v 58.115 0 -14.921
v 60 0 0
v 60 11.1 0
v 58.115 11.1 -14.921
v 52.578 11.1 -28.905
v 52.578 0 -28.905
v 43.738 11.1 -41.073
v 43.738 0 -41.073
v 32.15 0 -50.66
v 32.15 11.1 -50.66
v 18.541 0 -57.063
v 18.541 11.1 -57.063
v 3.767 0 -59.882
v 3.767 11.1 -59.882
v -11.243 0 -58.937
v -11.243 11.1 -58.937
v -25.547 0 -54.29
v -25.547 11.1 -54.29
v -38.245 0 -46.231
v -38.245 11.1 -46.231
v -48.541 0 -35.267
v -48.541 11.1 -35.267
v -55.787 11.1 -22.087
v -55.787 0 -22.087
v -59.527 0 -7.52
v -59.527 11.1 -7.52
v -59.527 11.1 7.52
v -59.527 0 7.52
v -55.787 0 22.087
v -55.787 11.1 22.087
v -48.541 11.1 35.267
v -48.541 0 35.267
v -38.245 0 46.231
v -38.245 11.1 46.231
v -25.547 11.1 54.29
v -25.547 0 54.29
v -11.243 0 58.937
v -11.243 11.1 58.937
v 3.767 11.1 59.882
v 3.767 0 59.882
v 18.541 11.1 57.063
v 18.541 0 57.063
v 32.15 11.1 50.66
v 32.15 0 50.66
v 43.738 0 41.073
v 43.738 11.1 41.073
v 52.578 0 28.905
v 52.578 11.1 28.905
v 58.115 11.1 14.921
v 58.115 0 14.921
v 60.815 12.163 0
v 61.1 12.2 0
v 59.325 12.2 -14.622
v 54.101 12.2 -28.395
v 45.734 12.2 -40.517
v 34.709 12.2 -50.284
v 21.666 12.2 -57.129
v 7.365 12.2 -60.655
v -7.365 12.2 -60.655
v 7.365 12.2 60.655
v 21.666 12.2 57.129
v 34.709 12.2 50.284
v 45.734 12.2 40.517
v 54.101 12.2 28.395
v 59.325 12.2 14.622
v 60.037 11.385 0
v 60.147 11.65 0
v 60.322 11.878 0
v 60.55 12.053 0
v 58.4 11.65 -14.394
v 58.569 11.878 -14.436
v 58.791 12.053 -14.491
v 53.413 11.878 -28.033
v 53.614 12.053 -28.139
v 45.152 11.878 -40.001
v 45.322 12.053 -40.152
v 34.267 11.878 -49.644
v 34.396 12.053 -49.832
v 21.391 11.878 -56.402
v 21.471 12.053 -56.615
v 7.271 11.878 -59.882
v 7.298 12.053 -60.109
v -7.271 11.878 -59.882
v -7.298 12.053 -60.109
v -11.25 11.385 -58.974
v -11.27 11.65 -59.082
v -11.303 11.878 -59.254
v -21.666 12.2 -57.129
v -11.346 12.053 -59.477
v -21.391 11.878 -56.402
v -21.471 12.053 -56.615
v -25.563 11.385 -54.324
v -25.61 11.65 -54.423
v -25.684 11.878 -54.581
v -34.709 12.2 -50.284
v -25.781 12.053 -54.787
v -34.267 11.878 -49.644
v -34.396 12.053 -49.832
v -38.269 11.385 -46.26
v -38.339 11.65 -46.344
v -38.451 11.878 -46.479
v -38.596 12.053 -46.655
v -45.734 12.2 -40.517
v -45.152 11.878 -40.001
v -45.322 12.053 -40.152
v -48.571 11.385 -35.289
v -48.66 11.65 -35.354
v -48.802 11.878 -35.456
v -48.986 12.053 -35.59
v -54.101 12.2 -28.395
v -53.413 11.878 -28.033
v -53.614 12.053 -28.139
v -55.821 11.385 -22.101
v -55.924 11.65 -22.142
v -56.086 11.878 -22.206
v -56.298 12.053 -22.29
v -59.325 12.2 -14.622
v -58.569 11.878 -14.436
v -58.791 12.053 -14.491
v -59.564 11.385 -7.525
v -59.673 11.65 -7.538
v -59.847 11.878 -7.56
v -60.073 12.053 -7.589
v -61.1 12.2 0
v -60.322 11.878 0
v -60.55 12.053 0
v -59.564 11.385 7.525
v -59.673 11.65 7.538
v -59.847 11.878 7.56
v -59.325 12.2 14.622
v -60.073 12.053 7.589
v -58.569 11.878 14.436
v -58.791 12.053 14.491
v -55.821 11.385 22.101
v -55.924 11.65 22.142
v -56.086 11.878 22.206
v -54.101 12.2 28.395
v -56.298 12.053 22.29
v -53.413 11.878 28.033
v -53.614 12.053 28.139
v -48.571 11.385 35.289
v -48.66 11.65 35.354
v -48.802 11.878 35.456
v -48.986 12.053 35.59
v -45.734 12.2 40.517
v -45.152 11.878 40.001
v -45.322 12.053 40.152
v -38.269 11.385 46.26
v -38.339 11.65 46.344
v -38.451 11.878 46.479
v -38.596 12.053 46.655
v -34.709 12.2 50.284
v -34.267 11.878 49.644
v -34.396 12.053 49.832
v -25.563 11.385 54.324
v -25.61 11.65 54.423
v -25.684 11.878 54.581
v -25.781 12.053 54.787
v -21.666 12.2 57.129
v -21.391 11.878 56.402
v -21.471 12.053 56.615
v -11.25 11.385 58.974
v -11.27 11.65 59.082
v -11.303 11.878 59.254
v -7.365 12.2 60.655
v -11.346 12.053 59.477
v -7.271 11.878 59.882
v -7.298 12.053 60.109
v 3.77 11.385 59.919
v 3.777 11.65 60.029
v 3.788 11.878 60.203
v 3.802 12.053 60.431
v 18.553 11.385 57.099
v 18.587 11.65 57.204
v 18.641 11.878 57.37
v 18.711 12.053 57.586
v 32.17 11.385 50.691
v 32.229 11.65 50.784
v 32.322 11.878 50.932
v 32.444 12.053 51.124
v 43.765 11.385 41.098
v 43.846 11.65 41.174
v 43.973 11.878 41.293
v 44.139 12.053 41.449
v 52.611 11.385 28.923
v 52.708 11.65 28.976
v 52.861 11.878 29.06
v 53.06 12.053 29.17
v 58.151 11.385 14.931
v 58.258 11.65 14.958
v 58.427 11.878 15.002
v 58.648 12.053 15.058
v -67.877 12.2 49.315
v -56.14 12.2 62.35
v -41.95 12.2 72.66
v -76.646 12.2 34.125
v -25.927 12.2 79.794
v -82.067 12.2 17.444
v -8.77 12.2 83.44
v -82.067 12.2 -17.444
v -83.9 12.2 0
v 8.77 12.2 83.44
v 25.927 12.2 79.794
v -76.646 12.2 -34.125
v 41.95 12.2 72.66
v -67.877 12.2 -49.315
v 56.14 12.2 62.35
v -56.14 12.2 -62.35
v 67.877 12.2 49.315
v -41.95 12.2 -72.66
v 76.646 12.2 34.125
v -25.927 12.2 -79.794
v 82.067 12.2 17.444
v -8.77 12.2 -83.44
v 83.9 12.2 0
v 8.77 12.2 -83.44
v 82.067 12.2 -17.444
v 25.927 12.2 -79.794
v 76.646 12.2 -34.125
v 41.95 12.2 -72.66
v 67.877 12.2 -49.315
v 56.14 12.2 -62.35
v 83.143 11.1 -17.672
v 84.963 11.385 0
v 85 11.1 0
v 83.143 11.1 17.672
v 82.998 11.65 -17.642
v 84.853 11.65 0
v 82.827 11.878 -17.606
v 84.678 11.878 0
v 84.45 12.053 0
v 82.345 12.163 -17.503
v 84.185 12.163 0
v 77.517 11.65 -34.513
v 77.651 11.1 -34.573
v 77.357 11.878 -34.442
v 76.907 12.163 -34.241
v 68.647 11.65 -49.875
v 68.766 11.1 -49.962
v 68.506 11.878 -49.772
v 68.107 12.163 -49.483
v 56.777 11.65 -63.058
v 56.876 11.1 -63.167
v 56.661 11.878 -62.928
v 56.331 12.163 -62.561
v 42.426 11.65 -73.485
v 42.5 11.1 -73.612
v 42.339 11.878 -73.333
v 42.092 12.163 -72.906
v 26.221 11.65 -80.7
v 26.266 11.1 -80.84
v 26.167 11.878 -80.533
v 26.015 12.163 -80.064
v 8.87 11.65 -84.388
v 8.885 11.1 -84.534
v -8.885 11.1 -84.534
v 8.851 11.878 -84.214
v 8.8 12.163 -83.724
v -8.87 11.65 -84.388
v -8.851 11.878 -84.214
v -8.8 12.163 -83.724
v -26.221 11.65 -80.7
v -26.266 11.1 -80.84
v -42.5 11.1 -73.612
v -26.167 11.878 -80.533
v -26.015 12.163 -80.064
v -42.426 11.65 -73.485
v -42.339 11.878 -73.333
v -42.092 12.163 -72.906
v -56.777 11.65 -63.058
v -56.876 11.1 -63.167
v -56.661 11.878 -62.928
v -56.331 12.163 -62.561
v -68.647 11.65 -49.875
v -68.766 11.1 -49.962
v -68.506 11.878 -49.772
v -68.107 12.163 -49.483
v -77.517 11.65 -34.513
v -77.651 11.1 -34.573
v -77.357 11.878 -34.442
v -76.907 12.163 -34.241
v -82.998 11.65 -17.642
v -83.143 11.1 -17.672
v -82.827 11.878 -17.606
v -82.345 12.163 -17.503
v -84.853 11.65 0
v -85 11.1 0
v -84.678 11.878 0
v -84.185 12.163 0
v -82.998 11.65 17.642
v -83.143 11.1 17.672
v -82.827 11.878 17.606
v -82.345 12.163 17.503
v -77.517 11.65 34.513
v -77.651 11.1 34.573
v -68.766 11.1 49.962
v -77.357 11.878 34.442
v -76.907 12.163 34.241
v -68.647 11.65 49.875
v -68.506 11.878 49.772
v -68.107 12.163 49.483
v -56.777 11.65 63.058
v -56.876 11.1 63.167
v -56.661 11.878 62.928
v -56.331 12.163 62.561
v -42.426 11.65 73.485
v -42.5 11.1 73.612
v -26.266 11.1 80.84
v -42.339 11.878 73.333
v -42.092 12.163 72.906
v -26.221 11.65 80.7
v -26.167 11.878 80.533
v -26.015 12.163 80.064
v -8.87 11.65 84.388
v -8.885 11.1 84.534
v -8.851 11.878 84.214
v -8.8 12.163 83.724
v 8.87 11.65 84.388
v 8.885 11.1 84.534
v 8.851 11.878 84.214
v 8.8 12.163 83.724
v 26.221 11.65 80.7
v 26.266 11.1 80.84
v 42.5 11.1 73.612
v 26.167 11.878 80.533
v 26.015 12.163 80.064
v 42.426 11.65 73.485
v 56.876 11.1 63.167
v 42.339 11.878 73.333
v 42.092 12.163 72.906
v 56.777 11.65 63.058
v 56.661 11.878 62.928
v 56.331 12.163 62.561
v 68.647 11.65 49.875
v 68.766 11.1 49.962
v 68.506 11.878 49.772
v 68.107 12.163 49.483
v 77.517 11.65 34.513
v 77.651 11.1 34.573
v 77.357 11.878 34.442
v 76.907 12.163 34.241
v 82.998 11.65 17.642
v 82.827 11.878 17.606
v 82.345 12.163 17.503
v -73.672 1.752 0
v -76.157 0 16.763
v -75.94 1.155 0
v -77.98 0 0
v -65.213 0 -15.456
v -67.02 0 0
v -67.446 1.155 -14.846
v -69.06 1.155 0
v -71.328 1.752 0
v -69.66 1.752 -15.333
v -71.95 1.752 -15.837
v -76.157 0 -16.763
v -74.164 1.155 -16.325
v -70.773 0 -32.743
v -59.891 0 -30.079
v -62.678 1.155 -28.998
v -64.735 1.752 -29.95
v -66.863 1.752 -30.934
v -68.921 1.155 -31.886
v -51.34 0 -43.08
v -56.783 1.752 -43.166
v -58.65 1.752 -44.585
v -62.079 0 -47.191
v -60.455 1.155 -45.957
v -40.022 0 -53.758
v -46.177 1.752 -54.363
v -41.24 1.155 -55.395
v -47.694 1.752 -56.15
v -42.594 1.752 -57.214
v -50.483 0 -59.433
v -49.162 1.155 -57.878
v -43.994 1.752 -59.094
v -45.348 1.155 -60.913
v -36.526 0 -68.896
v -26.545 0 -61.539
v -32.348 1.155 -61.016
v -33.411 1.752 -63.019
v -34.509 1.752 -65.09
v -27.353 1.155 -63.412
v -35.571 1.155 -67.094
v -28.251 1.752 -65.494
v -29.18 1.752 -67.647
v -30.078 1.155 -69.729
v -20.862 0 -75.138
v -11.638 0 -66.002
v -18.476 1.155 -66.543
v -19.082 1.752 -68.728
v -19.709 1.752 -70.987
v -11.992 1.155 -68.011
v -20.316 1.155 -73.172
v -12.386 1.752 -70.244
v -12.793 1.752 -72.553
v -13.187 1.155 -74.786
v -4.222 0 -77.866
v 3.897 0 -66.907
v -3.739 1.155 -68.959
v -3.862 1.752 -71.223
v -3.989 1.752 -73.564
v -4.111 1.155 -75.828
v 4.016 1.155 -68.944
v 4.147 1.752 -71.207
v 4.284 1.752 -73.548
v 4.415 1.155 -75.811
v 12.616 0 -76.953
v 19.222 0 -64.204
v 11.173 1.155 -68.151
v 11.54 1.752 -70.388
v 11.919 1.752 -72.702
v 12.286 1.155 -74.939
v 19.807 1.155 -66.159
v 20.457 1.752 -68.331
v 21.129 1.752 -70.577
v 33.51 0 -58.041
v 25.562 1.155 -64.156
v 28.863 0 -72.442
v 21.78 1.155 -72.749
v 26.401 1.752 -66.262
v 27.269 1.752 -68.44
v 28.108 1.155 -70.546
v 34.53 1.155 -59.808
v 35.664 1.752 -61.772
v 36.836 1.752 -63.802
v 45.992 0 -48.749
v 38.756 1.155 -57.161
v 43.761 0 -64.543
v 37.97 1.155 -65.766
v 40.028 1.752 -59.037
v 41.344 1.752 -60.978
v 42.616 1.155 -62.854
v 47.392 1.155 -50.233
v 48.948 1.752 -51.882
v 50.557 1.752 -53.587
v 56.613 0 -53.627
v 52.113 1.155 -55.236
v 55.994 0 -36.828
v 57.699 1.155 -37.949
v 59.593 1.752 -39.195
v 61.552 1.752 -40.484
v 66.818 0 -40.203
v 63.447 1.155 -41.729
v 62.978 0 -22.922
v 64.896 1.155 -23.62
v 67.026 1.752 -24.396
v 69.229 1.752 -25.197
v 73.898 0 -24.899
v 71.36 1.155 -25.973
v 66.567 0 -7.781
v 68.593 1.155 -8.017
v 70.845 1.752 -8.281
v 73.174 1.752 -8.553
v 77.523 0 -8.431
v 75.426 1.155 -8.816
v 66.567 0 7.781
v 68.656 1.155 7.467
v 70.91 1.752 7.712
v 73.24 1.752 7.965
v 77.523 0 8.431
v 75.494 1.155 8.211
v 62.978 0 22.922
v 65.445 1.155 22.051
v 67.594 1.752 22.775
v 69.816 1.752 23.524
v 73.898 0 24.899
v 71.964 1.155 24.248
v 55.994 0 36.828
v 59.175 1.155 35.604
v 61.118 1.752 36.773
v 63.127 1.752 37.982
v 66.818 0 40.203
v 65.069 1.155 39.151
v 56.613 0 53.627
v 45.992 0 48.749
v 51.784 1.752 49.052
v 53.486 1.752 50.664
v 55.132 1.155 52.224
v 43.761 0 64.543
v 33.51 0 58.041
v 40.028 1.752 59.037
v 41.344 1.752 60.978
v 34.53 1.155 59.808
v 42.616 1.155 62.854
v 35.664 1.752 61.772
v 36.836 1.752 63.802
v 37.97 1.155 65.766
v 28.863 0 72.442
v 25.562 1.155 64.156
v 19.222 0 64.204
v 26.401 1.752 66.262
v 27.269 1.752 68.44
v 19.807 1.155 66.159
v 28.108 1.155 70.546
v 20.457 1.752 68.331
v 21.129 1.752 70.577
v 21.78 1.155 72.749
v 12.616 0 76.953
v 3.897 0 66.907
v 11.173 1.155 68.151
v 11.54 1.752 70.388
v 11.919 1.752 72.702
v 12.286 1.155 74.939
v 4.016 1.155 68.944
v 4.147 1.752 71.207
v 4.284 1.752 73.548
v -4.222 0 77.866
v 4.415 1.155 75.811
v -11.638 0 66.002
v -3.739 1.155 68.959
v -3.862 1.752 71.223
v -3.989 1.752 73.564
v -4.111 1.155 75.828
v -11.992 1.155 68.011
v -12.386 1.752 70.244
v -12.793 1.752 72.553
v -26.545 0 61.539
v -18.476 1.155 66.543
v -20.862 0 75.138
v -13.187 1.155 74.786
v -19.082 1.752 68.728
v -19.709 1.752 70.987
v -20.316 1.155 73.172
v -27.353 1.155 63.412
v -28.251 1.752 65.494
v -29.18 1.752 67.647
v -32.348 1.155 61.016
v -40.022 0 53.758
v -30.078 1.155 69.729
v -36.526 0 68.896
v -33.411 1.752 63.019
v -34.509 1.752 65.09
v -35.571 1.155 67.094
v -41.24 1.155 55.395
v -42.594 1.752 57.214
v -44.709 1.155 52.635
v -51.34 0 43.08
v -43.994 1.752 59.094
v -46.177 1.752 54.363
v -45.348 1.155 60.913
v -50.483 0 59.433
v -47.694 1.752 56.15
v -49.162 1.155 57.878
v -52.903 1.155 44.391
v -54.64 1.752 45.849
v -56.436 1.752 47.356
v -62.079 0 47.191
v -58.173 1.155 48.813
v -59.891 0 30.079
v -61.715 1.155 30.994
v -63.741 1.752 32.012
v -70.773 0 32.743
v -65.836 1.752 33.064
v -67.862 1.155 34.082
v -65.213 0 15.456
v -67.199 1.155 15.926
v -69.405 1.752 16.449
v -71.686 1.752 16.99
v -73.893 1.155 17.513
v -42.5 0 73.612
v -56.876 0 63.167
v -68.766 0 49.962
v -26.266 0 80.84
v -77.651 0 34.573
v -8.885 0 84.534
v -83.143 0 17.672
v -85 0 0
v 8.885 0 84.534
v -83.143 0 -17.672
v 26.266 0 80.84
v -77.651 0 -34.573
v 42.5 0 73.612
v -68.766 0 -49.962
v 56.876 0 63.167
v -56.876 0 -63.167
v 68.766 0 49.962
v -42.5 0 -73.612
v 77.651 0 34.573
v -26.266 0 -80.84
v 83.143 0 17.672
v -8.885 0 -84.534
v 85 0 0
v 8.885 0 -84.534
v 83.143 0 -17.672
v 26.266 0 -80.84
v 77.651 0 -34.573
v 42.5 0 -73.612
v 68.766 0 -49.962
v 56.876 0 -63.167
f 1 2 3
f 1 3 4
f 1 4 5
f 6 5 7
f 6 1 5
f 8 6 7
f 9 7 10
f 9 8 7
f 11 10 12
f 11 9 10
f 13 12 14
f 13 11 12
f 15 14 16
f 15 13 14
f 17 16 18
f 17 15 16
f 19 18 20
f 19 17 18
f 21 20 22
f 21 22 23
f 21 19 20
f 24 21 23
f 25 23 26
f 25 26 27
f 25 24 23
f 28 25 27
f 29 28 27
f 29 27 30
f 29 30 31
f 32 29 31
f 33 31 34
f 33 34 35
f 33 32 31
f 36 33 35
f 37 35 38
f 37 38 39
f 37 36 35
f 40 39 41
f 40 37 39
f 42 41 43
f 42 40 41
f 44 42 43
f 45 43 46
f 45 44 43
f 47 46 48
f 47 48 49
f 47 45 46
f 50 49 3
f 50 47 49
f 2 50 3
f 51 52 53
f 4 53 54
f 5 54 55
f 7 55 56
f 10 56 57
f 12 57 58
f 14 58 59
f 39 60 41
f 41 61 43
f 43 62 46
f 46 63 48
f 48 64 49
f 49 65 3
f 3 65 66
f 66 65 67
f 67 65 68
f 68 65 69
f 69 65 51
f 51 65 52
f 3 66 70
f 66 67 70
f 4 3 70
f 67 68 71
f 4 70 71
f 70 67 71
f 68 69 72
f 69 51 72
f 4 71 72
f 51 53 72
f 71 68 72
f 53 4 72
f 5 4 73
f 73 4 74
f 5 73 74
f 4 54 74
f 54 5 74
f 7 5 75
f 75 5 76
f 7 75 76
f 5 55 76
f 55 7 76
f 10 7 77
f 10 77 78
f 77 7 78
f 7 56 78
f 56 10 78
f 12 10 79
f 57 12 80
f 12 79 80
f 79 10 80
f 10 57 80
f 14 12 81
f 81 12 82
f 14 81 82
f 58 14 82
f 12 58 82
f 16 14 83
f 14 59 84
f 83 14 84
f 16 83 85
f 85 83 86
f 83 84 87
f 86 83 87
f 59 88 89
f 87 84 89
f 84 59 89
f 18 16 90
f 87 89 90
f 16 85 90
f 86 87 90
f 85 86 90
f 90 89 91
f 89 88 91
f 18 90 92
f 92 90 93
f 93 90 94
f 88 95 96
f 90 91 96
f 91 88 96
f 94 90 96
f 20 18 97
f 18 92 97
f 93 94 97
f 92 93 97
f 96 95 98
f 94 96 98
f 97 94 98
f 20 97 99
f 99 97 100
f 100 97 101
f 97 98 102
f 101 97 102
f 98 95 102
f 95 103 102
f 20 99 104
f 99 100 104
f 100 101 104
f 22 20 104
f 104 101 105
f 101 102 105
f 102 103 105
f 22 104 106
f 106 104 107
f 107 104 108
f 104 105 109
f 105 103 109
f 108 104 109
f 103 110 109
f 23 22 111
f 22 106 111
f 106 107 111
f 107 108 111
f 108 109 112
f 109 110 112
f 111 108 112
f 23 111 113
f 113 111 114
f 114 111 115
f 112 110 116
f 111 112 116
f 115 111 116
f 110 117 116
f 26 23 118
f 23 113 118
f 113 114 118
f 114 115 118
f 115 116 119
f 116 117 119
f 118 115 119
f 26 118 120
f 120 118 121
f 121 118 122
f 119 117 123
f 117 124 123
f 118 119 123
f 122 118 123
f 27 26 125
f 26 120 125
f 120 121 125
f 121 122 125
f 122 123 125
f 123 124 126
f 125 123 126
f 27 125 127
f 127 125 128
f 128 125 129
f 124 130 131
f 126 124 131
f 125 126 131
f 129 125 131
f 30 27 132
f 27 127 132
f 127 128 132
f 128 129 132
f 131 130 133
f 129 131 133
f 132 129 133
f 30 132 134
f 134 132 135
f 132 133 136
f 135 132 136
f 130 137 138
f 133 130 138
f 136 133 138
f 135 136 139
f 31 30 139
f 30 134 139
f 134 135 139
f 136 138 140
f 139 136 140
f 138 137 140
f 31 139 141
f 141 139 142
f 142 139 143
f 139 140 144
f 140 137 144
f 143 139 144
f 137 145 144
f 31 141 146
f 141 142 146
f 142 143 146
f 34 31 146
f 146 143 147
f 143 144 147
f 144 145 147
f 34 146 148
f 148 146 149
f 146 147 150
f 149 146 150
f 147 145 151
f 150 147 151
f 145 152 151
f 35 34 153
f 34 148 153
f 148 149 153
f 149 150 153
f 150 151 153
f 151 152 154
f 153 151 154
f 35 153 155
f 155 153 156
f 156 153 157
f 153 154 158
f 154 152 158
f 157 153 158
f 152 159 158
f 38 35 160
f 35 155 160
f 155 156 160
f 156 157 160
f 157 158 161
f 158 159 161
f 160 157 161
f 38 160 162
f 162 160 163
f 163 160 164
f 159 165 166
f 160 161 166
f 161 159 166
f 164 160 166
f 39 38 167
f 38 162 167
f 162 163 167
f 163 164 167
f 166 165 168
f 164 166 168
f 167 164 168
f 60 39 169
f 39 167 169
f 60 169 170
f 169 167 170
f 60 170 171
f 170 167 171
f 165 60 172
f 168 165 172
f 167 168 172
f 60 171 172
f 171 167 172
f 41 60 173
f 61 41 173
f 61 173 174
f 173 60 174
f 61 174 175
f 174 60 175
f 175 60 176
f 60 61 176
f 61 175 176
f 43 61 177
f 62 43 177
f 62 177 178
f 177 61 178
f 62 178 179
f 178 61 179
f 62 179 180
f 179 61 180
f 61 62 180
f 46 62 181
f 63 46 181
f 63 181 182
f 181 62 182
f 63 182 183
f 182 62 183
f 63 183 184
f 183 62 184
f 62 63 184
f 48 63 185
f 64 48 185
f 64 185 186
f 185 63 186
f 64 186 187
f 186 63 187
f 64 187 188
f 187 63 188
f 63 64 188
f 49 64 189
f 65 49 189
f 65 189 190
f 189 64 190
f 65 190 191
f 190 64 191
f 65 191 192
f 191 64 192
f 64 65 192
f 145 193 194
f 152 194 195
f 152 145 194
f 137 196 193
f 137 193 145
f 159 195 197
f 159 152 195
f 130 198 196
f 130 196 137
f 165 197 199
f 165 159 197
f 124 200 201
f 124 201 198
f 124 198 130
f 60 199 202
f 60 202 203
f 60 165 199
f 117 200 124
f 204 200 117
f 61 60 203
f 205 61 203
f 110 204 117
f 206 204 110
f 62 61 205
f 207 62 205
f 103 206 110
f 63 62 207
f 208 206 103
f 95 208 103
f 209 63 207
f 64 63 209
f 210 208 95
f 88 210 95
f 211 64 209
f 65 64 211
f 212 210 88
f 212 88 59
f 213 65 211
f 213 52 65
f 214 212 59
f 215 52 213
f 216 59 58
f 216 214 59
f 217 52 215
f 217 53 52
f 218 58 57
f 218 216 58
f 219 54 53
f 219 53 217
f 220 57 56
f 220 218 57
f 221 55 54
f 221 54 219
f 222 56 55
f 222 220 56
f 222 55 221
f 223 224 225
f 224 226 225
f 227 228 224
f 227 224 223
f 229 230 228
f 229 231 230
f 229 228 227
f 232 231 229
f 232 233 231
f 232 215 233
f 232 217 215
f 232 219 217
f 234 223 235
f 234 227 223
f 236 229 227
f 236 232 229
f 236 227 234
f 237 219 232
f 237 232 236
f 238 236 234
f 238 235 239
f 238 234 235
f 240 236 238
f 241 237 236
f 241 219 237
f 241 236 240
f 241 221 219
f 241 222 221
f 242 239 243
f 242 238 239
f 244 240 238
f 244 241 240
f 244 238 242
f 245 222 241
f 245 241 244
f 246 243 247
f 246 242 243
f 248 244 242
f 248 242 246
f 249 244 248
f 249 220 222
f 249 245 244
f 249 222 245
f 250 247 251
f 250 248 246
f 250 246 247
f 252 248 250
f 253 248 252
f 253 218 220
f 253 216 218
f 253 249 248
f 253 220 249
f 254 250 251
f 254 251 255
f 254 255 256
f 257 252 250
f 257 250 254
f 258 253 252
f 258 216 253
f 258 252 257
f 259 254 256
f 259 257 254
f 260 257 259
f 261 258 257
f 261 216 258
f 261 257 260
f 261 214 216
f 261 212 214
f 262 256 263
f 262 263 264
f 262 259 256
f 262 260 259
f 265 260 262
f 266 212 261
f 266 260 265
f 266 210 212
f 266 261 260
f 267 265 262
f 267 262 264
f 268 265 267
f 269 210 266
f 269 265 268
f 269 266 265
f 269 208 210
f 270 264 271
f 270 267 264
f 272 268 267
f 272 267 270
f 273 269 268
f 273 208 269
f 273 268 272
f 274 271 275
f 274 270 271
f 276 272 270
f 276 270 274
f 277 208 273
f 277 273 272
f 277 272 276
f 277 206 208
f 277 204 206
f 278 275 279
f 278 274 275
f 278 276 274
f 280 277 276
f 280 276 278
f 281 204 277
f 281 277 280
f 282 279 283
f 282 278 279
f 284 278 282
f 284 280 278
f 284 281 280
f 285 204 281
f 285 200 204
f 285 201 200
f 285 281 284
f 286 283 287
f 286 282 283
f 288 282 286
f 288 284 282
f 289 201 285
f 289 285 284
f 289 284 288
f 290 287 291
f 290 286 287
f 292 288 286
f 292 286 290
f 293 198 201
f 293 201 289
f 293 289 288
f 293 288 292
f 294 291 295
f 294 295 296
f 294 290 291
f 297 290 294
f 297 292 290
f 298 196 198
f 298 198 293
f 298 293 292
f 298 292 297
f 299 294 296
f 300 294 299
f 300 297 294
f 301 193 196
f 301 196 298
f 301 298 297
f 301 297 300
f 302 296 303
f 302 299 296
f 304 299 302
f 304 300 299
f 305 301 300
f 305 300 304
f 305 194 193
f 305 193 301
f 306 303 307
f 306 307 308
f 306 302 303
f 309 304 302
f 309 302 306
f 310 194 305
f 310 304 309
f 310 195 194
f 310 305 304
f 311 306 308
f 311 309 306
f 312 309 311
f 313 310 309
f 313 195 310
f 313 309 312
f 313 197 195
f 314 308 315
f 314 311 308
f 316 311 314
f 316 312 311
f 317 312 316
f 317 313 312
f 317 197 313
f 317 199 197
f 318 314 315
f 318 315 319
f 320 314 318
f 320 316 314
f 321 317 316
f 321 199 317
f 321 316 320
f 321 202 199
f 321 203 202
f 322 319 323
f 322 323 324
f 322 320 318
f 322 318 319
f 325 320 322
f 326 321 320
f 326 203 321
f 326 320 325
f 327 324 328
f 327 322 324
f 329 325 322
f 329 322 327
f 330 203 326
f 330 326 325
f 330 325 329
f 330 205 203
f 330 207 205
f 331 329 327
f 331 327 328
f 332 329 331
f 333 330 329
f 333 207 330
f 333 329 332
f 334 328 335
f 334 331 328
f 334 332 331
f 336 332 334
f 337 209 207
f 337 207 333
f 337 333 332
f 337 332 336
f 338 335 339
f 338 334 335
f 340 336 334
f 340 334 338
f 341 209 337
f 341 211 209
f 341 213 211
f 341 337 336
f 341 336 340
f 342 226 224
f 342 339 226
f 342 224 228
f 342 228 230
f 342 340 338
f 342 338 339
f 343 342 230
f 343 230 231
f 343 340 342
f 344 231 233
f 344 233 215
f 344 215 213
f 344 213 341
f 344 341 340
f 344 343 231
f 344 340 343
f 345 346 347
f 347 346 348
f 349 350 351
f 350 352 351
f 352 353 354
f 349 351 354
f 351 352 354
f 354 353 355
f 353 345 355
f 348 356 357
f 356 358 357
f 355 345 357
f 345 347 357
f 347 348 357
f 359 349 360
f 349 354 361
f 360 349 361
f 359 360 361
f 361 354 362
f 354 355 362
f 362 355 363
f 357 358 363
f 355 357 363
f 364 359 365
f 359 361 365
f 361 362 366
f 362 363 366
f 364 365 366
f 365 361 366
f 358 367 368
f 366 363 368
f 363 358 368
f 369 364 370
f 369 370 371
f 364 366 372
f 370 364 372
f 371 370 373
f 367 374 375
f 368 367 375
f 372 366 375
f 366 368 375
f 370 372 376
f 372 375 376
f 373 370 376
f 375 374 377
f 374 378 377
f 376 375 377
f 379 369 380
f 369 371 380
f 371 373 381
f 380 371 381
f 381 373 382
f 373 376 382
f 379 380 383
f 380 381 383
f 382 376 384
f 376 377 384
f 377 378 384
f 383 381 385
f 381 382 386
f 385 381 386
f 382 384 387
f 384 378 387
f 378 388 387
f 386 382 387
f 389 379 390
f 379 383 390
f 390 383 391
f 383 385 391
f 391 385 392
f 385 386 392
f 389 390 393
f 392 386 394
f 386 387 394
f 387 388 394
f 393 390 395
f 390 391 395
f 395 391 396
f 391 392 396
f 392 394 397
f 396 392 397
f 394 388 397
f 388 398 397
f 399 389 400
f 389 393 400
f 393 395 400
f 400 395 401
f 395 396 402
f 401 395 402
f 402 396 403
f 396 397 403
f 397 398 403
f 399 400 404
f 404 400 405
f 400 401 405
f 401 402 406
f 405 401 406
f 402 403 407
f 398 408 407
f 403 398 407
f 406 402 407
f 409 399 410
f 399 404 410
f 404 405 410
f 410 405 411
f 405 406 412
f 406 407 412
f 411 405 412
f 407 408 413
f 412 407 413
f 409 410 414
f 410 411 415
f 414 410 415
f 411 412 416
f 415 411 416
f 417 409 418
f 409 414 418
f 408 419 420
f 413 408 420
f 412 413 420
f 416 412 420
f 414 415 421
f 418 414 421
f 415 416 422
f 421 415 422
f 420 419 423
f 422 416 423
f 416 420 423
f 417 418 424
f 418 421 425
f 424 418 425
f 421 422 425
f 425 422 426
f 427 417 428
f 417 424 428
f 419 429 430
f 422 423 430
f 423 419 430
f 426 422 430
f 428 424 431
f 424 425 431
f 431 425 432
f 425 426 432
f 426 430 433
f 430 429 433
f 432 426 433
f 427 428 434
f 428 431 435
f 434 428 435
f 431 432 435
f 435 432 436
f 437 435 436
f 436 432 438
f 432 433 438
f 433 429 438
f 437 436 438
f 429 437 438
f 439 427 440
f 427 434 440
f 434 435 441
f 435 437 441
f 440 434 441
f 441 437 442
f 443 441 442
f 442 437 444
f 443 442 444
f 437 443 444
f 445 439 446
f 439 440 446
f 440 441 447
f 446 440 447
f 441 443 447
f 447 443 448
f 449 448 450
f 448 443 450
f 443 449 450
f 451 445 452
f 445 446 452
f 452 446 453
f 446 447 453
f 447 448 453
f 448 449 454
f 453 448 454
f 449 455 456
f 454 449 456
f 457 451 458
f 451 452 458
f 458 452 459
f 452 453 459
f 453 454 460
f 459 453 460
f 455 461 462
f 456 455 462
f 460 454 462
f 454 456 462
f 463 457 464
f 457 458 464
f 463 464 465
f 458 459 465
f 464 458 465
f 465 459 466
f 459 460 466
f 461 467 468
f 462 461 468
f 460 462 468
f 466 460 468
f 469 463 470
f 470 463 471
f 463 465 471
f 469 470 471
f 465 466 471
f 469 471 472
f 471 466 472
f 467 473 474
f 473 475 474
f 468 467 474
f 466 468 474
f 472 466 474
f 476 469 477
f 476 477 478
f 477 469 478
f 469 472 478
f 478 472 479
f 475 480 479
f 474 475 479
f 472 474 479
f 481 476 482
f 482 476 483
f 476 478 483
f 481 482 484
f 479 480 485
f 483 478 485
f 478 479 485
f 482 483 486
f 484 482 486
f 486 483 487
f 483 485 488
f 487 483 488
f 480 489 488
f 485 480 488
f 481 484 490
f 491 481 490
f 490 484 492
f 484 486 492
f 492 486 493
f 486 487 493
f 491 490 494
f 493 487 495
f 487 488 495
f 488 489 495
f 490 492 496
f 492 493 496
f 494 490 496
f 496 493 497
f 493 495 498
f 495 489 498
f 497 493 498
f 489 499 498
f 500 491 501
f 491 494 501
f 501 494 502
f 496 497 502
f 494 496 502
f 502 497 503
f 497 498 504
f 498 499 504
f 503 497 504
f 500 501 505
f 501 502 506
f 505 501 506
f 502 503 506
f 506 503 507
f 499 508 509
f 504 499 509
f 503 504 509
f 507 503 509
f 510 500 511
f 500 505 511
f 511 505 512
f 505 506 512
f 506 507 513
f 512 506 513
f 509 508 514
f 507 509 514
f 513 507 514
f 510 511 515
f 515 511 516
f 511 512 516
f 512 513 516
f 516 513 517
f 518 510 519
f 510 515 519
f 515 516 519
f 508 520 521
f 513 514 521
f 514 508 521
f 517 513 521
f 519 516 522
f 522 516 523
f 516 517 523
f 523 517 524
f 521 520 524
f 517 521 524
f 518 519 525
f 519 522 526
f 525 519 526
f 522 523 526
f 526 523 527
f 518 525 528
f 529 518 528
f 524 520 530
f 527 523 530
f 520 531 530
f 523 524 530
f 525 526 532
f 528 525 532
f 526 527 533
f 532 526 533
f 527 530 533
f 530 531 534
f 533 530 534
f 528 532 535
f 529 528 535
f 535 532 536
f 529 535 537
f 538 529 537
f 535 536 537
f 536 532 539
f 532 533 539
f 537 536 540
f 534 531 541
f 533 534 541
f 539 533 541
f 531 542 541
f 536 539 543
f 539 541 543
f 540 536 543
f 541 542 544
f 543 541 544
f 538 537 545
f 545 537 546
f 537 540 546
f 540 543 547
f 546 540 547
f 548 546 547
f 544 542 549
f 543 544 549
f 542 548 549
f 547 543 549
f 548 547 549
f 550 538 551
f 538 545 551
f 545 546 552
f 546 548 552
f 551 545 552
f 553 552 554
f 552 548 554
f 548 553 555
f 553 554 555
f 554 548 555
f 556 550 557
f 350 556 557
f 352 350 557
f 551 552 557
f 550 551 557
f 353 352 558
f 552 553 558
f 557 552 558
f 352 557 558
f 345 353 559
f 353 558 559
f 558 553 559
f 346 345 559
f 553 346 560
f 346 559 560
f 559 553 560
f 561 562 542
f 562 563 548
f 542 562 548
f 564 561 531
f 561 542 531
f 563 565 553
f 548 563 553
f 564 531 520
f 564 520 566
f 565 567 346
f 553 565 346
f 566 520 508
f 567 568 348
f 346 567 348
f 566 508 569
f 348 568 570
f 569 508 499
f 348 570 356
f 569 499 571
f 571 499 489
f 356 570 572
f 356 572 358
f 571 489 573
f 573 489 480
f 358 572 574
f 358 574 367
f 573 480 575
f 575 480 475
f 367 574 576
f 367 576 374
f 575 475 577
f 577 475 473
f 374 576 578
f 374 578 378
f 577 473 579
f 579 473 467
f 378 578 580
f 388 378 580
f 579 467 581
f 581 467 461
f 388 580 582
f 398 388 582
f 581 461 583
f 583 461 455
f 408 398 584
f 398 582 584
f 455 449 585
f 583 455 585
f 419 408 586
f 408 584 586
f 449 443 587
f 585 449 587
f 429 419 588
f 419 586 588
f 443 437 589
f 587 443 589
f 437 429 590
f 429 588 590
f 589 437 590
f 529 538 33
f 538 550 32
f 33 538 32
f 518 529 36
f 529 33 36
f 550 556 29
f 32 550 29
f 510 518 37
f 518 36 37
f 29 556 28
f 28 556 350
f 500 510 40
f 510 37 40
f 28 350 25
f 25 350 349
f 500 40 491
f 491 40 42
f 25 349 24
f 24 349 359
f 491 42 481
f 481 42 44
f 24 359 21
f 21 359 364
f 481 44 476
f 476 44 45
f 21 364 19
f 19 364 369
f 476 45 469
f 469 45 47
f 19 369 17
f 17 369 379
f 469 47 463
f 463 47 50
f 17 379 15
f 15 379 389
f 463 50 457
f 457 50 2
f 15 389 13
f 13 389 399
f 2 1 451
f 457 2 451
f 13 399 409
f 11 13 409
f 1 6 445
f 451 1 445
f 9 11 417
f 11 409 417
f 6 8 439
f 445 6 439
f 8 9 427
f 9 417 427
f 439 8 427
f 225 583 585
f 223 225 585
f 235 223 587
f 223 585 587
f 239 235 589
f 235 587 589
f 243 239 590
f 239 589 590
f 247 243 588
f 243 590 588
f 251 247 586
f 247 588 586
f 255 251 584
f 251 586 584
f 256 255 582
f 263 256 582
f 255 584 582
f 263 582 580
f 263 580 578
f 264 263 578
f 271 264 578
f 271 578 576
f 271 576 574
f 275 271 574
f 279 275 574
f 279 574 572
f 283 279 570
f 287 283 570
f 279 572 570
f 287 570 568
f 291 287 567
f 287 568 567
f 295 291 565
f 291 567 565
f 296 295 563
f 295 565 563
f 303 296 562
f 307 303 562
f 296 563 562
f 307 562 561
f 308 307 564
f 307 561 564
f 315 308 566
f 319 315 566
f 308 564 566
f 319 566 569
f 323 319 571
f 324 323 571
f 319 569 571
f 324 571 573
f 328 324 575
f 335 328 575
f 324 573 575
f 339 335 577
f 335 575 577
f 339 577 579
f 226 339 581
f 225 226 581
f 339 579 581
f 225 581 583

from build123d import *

# Parameters (mm, degrees)
SKETCH1_R           = 85
SKETCH1_R_2         = 60
BOSS_EXTRUDE1_DEPTH = 12.2
FILLET1_R           = 1.1


with BuildPart() as part:
    # Sketch1 → Boss-Extrude1 (new body)
    with BuildSketch(Plane(origin=(0, 0, 0), x_dir=(1, 0, 0), z_dir=(0, 1, 0))):
        Circle(SKETCH1_R)
        Circle(SKETCH1_R_2, mode=Mode.SUBTRACT)
    extrude(amount=BOSS_EXTRUDE1_DEPTH)

    # Fillet1
    fillet1_edges = [part.edges().sort_by_distance(p)[0] for p in [
        (-85, 12.2, 0),
        (-60, 12.2, 0),
    ]]
    fillet(fillet1_edges, radius=FILLET1_R)

    # Sketch2 → Cut-Revolve1 (revolve, cut)
    with BuildSketch(Plane.XY):
        with BuildLine():
            Line((-77.98, 0), (-67.02, 0))
            ThreePointArc((-67.02, 0), (-72.5, 1.827500428), (-77.98, 0))
        make_face()
    revolve(axis=Axis((0, 11.1, 0), (0, -1, 0)), mode=Mode.SUBTRACT)


solid = part.part
